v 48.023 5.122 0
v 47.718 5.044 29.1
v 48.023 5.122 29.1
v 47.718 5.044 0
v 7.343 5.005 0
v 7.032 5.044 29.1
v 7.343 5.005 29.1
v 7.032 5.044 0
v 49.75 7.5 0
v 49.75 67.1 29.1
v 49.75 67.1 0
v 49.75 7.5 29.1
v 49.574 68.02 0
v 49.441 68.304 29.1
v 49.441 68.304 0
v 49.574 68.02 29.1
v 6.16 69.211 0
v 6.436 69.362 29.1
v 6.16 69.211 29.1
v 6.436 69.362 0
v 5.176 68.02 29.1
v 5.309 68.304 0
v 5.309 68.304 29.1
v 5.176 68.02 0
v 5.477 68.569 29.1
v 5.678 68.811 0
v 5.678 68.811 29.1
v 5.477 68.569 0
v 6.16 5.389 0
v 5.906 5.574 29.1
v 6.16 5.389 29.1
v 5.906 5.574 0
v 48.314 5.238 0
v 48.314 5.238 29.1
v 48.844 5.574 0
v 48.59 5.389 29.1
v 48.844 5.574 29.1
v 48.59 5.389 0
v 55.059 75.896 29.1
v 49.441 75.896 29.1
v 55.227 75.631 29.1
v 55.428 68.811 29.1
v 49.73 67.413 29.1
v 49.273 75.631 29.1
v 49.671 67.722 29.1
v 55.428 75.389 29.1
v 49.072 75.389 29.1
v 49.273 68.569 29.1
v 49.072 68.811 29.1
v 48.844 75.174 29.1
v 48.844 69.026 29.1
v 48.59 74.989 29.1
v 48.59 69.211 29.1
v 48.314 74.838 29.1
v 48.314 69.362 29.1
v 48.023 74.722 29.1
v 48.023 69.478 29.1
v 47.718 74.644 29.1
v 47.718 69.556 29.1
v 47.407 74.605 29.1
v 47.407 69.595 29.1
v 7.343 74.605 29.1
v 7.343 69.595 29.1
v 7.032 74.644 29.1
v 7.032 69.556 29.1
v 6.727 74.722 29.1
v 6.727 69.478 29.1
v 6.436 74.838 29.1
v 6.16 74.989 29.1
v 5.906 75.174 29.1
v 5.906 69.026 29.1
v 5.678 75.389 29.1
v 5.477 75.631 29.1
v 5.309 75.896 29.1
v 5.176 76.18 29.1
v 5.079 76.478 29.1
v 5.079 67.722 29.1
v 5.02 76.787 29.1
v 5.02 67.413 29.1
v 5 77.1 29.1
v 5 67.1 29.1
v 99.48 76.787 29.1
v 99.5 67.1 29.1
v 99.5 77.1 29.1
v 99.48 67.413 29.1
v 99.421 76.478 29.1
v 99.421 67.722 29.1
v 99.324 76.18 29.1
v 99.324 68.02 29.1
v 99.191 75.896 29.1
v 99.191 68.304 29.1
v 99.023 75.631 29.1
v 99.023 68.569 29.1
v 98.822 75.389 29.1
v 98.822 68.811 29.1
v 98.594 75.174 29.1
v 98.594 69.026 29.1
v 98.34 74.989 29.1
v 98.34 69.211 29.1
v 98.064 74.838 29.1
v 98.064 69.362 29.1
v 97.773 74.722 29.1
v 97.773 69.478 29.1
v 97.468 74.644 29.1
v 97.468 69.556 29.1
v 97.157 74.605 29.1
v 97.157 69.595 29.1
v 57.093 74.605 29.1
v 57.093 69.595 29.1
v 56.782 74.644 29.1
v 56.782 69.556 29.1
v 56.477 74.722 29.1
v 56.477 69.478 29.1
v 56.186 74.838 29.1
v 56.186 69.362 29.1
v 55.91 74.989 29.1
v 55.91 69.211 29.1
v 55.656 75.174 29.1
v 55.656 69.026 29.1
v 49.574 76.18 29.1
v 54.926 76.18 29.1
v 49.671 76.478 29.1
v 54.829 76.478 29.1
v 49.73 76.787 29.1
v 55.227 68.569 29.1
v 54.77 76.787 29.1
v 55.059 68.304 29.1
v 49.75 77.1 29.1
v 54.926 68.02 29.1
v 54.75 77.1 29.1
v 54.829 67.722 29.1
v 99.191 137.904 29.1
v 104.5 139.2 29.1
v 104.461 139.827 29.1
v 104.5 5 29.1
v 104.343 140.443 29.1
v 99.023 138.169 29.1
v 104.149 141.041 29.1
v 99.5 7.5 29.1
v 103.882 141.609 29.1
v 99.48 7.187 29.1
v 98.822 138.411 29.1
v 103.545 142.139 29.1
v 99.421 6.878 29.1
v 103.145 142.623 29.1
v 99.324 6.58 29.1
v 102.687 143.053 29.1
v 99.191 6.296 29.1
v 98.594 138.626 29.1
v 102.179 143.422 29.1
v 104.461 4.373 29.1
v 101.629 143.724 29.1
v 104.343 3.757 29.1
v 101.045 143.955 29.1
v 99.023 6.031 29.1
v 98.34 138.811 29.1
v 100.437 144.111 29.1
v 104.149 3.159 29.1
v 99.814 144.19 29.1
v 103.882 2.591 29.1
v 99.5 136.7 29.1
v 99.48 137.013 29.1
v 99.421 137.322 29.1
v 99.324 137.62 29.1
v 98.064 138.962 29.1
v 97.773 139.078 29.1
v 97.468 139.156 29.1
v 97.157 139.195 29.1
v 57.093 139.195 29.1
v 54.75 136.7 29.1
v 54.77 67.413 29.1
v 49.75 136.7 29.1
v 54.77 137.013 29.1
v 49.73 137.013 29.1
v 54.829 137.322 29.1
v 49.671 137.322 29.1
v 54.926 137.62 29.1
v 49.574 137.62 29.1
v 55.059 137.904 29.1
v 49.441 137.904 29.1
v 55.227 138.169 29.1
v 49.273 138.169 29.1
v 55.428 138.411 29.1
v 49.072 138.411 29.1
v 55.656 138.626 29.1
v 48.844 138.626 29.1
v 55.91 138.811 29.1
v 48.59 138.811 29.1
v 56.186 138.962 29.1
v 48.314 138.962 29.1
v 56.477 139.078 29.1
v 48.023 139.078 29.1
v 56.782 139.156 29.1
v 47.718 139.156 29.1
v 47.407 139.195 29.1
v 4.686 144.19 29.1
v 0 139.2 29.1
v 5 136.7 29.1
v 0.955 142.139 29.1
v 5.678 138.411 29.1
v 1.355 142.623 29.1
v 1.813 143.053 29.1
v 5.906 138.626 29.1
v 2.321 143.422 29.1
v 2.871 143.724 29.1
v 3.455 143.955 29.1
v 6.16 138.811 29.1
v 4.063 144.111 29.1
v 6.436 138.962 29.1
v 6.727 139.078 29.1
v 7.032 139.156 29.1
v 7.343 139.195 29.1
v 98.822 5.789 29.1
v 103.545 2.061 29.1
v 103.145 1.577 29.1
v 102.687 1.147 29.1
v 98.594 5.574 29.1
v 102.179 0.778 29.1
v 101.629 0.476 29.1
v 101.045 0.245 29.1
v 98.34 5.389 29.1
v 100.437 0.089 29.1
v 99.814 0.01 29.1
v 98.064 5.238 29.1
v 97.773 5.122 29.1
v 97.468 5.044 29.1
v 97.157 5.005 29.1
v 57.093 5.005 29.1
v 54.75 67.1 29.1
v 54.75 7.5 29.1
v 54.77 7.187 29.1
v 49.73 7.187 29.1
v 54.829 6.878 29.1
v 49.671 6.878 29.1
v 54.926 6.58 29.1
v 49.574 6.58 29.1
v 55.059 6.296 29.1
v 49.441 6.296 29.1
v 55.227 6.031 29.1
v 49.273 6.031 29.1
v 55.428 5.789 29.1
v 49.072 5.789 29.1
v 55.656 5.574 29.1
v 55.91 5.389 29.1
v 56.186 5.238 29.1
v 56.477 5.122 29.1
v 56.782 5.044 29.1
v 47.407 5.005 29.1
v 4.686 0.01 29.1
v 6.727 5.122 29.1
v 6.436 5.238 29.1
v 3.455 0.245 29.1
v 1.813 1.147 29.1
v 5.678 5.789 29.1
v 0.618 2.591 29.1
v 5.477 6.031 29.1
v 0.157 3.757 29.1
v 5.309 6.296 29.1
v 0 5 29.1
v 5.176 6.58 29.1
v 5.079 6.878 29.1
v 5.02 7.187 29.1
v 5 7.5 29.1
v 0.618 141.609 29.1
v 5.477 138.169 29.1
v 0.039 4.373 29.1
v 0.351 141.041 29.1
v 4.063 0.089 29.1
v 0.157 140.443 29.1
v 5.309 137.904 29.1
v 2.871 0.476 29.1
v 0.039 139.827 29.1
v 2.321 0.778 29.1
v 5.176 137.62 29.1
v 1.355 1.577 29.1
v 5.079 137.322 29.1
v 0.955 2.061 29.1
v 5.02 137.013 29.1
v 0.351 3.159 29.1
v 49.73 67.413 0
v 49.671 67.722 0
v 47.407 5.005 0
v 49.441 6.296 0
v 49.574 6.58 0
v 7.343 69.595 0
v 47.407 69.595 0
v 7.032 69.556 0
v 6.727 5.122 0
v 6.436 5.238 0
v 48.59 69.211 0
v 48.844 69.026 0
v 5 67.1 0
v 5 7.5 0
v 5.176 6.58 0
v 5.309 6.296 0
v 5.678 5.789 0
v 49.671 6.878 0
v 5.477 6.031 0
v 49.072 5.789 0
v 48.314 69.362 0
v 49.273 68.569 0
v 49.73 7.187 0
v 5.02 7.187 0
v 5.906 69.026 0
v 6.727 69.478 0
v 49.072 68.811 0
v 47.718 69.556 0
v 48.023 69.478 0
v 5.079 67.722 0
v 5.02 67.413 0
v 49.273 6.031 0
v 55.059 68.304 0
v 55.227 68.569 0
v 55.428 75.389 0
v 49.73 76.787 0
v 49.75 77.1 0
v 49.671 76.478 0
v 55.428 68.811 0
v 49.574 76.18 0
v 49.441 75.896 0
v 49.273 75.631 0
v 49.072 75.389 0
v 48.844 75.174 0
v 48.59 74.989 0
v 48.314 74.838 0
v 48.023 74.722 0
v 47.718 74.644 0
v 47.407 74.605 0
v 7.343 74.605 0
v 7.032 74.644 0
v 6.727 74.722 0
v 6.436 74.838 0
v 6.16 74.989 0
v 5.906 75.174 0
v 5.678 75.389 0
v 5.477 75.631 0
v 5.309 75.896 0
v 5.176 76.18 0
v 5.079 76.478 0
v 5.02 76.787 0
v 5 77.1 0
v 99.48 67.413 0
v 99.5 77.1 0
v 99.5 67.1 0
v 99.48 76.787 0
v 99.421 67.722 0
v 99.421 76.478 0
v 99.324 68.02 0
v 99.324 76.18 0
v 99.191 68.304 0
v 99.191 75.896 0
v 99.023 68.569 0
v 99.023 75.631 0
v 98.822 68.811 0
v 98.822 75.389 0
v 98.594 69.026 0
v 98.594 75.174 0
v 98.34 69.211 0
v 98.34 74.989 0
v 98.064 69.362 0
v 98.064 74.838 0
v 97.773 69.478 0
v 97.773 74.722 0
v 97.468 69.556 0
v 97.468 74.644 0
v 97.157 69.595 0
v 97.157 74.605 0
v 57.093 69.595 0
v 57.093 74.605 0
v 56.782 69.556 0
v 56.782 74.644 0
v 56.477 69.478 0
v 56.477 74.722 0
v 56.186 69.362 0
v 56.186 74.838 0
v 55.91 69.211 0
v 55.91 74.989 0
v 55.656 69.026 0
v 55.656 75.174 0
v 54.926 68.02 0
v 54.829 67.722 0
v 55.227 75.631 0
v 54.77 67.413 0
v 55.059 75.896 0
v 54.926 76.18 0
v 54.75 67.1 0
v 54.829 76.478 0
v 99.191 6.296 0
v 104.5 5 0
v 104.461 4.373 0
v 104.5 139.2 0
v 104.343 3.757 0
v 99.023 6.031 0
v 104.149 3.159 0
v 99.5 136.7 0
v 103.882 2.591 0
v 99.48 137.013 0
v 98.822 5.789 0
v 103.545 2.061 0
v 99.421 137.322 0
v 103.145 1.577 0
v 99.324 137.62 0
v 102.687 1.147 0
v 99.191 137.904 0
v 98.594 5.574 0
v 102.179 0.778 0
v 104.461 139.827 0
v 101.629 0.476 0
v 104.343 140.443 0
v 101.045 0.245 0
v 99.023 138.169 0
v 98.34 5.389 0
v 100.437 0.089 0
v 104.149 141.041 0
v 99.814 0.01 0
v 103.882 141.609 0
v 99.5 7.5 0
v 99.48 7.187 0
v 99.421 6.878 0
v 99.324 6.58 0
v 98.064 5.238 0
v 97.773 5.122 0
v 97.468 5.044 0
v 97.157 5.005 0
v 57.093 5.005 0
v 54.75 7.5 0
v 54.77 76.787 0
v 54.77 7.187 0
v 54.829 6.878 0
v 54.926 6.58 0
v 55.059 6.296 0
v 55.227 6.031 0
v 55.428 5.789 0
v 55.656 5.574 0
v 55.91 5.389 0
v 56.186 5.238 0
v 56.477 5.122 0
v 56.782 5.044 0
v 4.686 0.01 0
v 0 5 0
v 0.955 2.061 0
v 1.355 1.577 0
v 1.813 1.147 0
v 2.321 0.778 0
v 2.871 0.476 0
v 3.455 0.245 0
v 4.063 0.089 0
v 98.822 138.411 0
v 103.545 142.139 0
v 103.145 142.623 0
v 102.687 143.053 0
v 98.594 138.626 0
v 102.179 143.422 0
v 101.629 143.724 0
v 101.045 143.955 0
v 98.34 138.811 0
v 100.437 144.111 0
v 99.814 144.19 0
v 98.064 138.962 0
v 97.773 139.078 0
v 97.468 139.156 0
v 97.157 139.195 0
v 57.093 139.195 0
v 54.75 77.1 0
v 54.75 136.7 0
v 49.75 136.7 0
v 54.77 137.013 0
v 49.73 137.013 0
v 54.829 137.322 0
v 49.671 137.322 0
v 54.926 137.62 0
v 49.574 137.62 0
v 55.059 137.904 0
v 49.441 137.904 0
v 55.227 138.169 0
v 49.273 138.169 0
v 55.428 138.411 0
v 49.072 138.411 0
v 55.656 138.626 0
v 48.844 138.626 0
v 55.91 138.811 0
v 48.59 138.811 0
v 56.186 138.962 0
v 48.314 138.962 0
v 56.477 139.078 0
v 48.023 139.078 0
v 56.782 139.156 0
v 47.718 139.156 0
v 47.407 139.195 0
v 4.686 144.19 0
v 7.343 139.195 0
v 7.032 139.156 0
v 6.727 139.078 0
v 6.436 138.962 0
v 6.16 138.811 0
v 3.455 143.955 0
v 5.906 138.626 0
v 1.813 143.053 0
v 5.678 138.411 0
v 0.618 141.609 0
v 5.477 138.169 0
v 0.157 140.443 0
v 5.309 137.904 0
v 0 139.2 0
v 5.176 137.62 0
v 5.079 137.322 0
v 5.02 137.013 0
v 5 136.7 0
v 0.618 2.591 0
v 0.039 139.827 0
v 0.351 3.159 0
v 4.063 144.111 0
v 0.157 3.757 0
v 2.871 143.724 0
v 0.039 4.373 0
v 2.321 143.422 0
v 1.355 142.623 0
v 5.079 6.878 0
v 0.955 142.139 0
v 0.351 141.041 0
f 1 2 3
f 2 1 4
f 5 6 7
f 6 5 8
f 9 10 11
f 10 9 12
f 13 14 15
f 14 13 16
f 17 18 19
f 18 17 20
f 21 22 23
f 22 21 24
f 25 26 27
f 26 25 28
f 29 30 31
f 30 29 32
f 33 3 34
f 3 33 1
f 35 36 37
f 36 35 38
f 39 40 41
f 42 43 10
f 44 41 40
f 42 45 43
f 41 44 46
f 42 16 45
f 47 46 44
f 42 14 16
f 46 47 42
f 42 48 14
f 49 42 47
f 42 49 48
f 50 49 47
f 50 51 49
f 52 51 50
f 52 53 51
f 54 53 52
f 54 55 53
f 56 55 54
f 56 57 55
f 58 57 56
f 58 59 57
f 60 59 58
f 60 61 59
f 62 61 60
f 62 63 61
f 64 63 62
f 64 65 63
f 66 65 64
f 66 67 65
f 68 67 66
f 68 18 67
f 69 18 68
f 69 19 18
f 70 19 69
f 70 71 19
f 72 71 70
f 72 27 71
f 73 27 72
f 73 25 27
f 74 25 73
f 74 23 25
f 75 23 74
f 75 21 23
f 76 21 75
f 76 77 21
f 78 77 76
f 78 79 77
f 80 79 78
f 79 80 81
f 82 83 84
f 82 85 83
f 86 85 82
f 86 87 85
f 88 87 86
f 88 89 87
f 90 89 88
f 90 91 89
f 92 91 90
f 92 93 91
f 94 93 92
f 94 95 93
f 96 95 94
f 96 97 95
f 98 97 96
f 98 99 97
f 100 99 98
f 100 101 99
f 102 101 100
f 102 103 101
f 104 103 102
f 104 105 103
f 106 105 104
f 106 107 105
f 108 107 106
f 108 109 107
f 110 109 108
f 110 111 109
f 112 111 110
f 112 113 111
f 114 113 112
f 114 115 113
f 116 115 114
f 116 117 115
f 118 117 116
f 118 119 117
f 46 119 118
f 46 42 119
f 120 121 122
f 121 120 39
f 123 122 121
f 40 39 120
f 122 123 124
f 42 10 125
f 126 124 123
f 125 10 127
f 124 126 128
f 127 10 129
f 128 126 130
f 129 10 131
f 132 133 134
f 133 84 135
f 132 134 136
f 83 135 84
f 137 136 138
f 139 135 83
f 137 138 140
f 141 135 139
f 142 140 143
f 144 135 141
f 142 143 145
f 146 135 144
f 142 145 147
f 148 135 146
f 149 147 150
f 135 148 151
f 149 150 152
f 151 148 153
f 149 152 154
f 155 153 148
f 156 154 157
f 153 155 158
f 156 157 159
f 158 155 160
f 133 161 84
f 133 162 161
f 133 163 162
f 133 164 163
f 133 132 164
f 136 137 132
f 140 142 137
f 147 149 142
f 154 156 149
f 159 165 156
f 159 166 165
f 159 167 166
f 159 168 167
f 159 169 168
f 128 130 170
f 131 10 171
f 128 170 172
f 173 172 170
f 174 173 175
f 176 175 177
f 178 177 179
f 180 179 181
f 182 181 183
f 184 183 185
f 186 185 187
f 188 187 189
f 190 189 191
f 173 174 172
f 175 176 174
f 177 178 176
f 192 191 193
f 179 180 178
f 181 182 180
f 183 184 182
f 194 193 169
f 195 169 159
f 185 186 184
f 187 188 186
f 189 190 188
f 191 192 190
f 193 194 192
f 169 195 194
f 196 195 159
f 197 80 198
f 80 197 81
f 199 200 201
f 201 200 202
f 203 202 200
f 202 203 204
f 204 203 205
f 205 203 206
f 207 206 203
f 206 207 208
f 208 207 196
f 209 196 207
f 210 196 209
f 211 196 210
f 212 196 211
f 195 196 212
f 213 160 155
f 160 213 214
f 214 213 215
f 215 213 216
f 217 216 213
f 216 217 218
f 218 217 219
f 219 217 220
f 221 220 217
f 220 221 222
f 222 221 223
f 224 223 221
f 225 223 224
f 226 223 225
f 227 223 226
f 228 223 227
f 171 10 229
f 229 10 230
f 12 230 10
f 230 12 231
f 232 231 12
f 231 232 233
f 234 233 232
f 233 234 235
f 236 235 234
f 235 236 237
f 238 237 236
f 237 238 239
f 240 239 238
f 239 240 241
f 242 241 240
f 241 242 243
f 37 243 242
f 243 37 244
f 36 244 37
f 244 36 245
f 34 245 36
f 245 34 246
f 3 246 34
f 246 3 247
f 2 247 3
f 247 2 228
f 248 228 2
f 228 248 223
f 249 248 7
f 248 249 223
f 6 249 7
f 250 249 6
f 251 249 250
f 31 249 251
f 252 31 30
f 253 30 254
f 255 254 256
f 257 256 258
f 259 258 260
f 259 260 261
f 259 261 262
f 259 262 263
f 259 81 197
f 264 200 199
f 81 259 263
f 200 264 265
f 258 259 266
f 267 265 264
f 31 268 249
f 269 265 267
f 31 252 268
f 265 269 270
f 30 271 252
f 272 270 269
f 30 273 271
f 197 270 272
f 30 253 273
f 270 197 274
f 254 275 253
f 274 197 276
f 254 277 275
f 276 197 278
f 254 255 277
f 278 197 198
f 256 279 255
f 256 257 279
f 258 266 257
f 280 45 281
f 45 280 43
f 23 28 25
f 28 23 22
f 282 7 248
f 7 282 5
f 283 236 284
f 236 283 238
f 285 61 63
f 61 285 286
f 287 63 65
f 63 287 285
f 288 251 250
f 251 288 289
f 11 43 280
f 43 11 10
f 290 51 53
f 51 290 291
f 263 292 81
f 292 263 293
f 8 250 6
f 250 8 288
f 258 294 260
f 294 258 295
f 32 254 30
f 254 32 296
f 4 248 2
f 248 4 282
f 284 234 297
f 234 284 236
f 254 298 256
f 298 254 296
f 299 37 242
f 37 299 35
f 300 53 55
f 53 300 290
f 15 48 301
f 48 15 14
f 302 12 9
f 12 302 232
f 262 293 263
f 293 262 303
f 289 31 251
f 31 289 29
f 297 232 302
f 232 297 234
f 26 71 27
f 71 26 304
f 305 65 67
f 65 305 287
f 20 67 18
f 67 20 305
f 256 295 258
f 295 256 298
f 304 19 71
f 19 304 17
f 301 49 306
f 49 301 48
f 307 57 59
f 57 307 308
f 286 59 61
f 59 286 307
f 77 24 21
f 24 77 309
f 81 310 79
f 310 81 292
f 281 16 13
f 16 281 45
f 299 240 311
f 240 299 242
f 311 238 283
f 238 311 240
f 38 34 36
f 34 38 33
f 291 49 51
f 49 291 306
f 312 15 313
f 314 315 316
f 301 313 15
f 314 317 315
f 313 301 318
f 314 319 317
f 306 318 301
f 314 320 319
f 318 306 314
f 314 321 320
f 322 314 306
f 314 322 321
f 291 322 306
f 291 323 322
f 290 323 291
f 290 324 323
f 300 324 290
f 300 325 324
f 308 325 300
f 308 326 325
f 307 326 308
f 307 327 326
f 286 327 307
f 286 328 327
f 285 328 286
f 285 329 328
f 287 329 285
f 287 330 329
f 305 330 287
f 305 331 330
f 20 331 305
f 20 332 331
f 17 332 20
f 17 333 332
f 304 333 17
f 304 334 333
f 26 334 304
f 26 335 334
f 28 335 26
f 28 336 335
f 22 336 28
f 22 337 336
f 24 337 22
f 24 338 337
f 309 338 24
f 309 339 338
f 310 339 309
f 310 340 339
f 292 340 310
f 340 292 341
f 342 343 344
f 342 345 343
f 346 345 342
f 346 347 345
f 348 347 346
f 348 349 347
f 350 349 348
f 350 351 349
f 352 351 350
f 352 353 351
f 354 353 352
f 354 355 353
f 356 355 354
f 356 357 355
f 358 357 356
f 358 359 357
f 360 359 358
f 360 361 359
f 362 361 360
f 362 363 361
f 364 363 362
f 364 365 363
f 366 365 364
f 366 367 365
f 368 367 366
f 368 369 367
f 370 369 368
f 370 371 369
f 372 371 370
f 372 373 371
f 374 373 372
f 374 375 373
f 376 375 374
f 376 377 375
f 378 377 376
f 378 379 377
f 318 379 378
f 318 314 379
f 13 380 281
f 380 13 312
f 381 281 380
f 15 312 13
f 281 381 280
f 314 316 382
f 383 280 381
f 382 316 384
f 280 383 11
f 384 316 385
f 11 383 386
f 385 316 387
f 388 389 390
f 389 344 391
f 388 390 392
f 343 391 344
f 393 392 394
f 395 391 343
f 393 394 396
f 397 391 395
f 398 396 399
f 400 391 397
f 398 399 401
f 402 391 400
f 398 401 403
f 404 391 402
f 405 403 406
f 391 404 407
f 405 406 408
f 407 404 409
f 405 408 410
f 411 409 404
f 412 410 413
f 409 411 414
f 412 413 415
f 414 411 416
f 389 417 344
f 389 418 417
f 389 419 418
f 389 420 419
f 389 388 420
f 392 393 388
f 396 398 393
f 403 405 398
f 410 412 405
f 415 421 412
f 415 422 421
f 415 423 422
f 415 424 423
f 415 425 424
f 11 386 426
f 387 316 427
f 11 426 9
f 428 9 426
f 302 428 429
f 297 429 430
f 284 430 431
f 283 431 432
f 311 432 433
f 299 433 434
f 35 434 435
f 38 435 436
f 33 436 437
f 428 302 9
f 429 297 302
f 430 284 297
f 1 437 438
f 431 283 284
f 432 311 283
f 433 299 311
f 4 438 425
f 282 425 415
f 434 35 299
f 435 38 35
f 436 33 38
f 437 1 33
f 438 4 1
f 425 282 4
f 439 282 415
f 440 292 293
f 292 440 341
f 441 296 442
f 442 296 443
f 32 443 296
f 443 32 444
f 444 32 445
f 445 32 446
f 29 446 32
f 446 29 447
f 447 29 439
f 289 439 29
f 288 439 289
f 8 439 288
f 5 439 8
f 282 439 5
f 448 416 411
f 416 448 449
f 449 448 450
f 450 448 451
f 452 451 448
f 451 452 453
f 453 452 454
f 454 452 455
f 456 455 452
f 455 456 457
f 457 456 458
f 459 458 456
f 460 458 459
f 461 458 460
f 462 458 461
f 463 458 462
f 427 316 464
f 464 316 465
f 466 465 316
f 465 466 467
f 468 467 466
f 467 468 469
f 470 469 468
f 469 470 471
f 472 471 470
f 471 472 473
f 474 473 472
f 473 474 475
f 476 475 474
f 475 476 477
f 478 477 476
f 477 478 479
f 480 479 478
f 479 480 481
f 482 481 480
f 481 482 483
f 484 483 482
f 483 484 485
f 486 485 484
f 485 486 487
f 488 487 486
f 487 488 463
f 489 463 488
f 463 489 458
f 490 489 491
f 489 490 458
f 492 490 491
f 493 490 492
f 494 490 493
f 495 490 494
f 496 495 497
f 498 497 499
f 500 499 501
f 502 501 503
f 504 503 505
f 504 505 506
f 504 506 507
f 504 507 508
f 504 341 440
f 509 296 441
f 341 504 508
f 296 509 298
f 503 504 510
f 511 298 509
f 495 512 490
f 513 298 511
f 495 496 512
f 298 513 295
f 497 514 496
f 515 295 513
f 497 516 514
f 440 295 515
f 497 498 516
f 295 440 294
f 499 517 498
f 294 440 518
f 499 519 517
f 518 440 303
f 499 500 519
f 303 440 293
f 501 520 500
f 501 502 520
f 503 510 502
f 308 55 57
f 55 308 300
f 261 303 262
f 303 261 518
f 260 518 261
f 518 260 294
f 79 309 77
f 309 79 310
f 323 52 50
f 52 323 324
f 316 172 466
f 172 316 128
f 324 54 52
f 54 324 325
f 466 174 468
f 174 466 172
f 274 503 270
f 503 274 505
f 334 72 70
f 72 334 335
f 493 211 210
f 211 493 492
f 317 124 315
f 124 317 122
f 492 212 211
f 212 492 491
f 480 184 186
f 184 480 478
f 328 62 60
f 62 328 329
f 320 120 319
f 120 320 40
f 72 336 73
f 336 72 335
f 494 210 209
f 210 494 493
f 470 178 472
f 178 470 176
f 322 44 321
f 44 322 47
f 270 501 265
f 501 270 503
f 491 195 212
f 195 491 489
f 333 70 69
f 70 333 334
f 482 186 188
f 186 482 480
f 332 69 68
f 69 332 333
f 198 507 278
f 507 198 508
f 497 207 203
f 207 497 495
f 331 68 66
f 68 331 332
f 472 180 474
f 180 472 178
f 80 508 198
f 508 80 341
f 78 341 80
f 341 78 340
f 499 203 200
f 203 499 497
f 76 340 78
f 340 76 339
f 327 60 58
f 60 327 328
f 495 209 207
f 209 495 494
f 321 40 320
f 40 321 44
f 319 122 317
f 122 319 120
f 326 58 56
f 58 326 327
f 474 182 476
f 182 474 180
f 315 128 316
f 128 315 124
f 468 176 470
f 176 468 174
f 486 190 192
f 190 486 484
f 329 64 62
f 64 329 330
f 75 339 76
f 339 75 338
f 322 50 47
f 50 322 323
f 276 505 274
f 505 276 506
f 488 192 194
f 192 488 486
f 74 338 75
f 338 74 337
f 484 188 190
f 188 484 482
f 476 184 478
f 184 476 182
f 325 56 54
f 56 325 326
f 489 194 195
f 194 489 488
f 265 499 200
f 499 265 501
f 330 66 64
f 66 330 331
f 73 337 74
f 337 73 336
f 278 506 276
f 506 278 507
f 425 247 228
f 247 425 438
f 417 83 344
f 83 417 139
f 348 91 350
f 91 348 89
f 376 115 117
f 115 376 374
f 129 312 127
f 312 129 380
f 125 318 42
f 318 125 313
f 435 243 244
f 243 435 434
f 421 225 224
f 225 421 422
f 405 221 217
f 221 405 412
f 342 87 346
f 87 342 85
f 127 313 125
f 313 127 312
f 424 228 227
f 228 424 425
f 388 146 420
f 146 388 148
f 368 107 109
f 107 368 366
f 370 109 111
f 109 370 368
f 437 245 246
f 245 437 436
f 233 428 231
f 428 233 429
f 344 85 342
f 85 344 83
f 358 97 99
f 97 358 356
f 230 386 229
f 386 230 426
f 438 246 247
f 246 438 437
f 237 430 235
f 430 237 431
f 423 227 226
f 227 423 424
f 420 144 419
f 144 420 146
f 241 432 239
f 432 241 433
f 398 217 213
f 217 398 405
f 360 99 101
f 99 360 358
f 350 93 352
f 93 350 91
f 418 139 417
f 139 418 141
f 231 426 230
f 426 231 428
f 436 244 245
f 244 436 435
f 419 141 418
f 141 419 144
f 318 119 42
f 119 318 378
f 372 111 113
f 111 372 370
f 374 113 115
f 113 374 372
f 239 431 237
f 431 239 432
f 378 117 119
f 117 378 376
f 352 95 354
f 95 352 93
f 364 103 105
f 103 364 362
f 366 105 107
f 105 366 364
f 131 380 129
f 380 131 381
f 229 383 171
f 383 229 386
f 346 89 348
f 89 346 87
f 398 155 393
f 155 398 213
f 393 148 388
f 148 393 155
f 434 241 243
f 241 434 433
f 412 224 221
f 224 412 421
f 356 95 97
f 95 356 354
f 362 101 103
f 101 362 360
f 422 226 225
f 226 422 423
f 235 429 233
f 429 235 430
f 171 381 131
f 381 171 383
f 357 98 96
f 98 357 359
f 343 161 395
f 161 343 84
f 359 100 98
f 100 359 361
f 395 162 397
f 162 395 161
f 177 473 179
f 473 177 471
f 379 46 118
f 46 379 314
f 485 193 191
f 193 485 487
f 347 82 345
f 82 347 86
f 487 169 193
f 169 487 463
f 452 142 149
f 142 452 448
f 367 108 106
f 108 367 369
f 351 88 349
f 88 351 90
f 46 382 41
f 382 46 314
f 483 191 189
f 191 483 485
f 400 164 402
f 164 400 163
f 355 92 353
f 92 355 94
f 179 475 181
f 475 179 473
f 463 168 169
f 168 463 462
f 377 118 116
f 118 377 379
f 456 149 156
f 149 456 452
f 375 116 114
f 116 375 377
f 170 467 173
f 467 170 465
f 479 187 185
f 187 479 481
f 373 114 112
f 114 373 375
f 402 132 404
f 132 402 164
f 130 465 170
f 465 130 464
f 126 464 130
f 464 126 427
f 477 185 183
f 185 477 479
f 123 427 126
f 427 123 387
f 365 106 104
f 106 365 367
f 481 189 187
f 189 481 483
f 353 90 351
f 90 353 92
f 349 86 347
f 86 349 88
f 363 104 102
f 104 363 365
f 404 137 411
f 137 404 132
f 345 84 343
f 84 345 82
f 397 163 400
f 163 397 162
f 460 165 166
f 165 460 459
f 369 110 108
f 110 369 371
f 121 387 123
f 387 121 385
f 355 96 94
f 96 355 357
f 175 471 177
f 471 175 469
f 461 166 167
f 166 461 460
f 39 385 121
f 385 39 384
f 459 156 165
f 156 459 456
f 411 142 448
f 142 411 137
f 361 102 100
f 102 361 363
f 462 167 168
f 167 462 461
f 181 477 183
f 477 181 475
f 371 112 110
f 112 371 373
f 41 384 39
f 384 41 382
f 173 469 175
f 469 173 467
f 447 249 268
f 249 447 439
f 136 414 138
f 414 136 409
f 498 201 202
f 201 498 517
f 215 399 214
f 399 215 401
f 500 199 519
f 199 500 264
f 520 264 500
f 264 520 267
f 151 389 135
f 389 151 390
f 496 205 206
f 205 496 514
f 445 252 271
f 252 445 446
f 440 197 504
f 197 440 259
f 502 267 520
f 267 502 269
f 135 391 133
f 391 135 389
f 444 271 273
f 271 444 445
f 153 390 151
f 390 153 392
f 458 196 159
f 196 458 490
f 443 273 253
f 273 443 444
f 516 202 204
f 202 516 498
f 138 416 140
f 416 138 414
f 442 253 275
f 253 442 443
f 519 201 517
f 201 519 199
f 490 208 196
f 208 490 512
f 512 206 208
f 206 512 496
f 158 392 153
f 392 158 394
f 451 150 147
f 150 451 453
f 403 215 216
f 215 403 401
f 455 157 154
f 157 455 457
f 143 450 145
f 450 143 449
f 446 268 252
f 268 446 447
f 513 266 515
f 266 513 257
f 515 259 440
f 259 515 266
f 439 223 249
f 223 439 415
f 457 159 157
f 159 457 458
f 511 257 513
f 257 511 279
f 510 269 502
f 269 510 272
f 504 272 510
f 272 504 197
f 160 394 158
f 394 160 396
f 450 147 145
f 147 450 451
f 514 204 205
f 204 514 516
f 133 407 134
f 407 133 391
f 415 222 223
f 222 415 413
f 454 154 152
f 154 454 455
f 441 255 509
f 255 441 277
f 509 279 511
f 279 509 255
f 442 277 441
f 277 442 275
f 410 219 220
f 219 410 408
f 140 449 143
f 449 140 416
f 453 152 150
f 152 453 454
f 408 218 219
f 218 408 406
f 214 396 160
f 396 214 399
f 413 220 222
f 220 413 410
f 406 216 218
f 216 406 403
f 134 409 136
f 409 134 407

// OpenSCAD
// file: ../../shared/chit_storage.scad
module chit_storage(
  width = 100,
  height = 25,
  depth = 22,
  wall_thickness = 2,
  front_wall_thickness = 1,
  columns = 5,
  single_column = true,
  chit_size = 16,
  diameter,
  rounded_ness = 100,
  chit_tolerance = 1,
  chit_thickness = 2,
  chit_count_per_slot = 10,
  finger_spaces = false,
  finger_space_width = 10,
  cover = false,
  cover_thickness = 1,
  cover_wall_thickness = 1,
  cover_text,
  cover_text_size = 5,
  render_cover_separate = false,
) {
  // actual_width = height > width ? height : width;
  // actual_height = height > width ? width : height;

  // vertical = height > width;

  actual_width = width;
  actual_height = height;

  vertical = false;

  chit_x_size = !is_undef(chit_size) ? is_list(chit_size) ? chit_size[0] : chit_size : 0;
  chit_y_size = !is_undef(chit_size) ? is_list(chit_size) ? chit_size[1] : chit_size : 0;
  chit_total_x_size = chit_x_size + chit_tolerance;
  chit_total_y_size = chit_y_size + chit_tolerance;

  chit_total_diameter = is_undef(diameter) ? 0 : diameter + chit_tolerance;

  row_width =
    is_undef(diameter) ?
      chit_total_x_size * columns + wall_thickness * (columns - 1)
    : chit_total_diameter * columns + wall_thickness * (columns - 1);
  row_offset = (actual_width - row_width) / 2;

  module chit_row() {
    for (i = [0:1:(columns - 1)]) {
      translate(
        [
          is_undef(diameter) ?
            (chit_total_x_size + wall_thickness) * i
          : (chit_total_diameter + wall_thickness) * i,
          0,
          0,
        ]
      ) {
        if (is_undef(diameter)) {
          cube([chit_total_x_size, chit_total_y_size, chit_thickness * chit_count_per_slot + chit_tolerance / 2]);

          radius = (chit_total_x_size - 4) / 2;

          translate([chit_total_x_size / 2, -1, -depth])
            scale([1, 1.25, 1])
              cylinder(r=radius, h=2 * depth, $fn=100);
        } else {
          translate([chit_total_diameter / 2, chit_total_diameter / 2, 0])
            cylinder(r=chit_total_diameter / 2, h=chit_thickness * chit_count_per_slot + chit_tolerance / 2, $fn=rounded_ness);

          radius = (chit_total_diameter - 4) / 2;

          translate([chit_total_diameter / 2, -1, -depth])
            scale([1, 1.25, 1])
              cylinder(r=radius, h=2 * depth, $fn=100);
        }
      }
    }
  }

  module finger_cylinder() {
    finger_space_height = (actual_height - 8) / 2;

    scale([1, finger_space_height / finger_space_width, 1])
      cylinder(r=finger_space_width, h=depth, $fn=100);
  }

  module cover() {
    render()
      difference() {
        union() {
          translate([0, 0, depth - cover_thickness])
            cube([actual_width, actual_height, cover_thickness]);

          translate([0, 0, depth / 2])
            difference() {

              cube([actual_width, actual_height, depth / 2]);

              translate([cover_wall_thickness, cover_wall_thickness, 0])
                cube(
                  [
                    actual_width - 2 * cover_wall_thickness,
                    actual_height - 2 * cover_wall_thickness,
                    depth / 2,
                  ]
                );
            }
        }

        if (is_string(cover_text)) {
          metrics = textmetrics(cover_text, cover_text_size);
          text_width = metrics.size.x;
          text_height = metrics.ascent;

          text_inset = min(0.5, cover_thickness / 2);

          translate([actual_width / 2 - text_width / 2, actual_height / 2 - text_height / 2, depth - text_inset])
            linear_extrude(text_inset)
              text(cover_text, cover_text_size);
        }
      }
  }

  translate([0, vertical ? actual_width : 0, 0])
    rotate(vertical ? 270 : 0, [0, 0, 1]) {
      render() difference() {
          cube([actual_width, actual_height, depth - (cover ? cover_thickness : 0)]);

          translate([row_offset, front_wall_thickness, depth - (chit_thickness * chit_count_per_slot) - chit_tolerance / 2 - (cover ? cover_thickness : 0)]) chit_row();

          if (!single_column) {
            translate([row_width + row_offset, actual_height - front_wall_thickness, depth - (chit_thickness * chit_count_per_slot) - chit_tolerance / 2 - (cover ? cover_thickness : 0)])
              rotate(180, [0, 0, 1])
                chit_row();

            if (finger_spaces) {
              single_chit_cube_height =
                is_undef(diameter) ? front_wall_thickness + chit_total_x_size + wall_thickness
                : front_wall_thickness + chit_total_diameter + wall_thickness;
              remaining_space = actual_height - 2 * single_chit_cube_height;

              translate([0, single_chit_cube_height + remaining_space / 2, 0])
                finger_cylinder();

              translate([actual_width, single_chit_cube_height + remaining_space / 2, 0])
                finger_cylinder();
            }
          }

          if (cover) {
            translate([0, 0, depth / 3])
              difference() {
                cube([actual_width, actual_height, depth * 2 / 3]);

                cover_tolerance = 0.3;

                translate([cover_wall_thickness + cover_tolerance, cover_wall_thickness + cover_tolerance, 0])
                  cube(
                    [
                      actual_width - 2 * (cover_wall_thickness + cover_tolerance),
                      actual_height - 2 * (cover_wall_thickness + cover_tolerance),
                      depth * 2 / 3,
                    ]
                  );
              }
          }
        }

      if (cover) {
        if (render_cover_separate) {
          translate([0, 2 * actual_height + 10, depth / 4])
            rotate(180, [1, 0, 0])
              translate([0, 0, -depth * 3 / 4])
                cover();
        } else {
          cover();
        }
      }
    }
}

module chit_storage_filler(
  text,
  text_size = 5,
  text_inset = 1,
  chit_size = 16,
  chit_tolerance = 1,
  chit_thickness = 2,
  chit_count = 10,
) {
  filler_fit_tolerance = 0.3;

  chit_x_size = is_list(chit_size) ? chit_size[0] : chit_size;
  chit_y_size = is_list(chit_size) ? chit_size[1] : chit_size;
  chit_total_x_size = chit_x_size + chit_tolerance - filler_fit_tolerance;
  chit_total_y_size = chit_y_size + chit_tolerance - filler_fit_tolerance;

  render() difference() {
      cube([chit_total_x_size, chit_total_y_size, chit_thickness * chit_count]);

      radius = (chit_total_x_size - 4) / 2;

      translate([chit_total_x_size / 2, -1, 0])
        scale([1, 1.25, 1])
          cylinder(r=radius, h=chit_thickness * chit_count, $fn=100);

      if (!is_undef(text)) {
        name = is_string(text) ? text : str(text);

        metrics = textmetrics(text=name, size=text_size);
        text_width = metrics.advance.x;
        text_height = metrics.ascent;

        translate([chit_total_x_size / 2 - text_width / 2, chit_total_y_size / 2, chit_thickness * chit_count - text_inset])
          linear_extrude(text_inset)
            text(name, text_size);
      }
    }
}

chit_storage(
  height=41,
  columns=4,
  front_wall_thickness=2,
  single_column=false,
  finger_spaces=true,
  cover=true,
  render_cover_separate=true,
  cover_text="Test",
);
// file: ../../shared/spacer.scad
use <rounded_cube.scad>

module generate_spacer(
  wall_thickness = 5,
  area_split = [2, 2],
  fill_parameter = [[220, 2], [290, 2], [35, 1]],
  single_for_rendering = false,
) {
  spacer_width = fill_parameter[0][0] / fill_parameter[0][1];
  spacer_height = fill_parameter[1][0] / fill_parameter[1][1];
  spacer_thickness = fill_parameter[2][0] / fill_parameter[2][1];

  for (x = [0:fill_parameter[0][1] - 1]) {
    for (y = [0:fill_parameter[1][1] - 1]) {
      for (z = [0:fill_parameter[2][1] - 1]) {
        if (single_for_rendering && x == 0 && y == 0 && z == 0 || !single_for_rendering) {
          translate([x * spacer_width, y * spacer_height, z * spacer_thickness])
            render()
              difference() {
                rounded_cube([spacer_width, spacer_height, spacer_thickness], corner_radius=wall_thickness);

                hole_width = (spacer_width - (area_split[0] + 1) * wall_thickness) / area_split[0];
                hole_height = (spacer_height - (area_split[1] + 1) * wall_thickness) / area_split[1];

                for (hx = [0:area_split[0] - 1]) {
                  for (hy = [0:area_split[1] - 1]) {

                    translate(
                      [
                        wall_thickness + hx * (hole_width + wall_thickness),
                        wall_thickness + hy * (hole_height + wall_thickness),
                        0,
                      ]
                    )
                      rounded_cube([hole_width, hole_height, spacer_thickness], corner_radius=wall_thickness / 2);
                  }
                }
              }
        }
      }
    }
  }
}
// file: ../../shared/rounded_cube.scad
module rounded_cube(
  extents,
  corner_radius = 3,
) {
  $fn = 50;

  hull() {
    translate([corner_radius, corner_radius, 0])
      cylinder(h=extents[2], r=corner_radius);

    translate([extents[0] - corner_radius, corner_radius, 0])
      cylinder(h=extents[2], r=corner_radius);

    translate([corner_radius, extents[1] - corner_radius, 0])
      cylinder(h=extents[2], r=corner_radius);

    translate([extents[0] - corner_radius, extents[1] - corner_radius, 0])
      cylinder(h=extents[2], r=corner_radius);
  }
}
// file: ../../shared/general_storage.scad
use <chit_storage.scad>

function calculate_chit_count(chit_thickness, bottom_wall_thickness, depth, cover_thickness) =
  floor((depth - bottom_wall_thickness - cover_thickness) / chit_thickness);

module general_storage(
  chit_size,
  chit_diameter,
  rounded_ness,
  chit_tolerance,
  chit_thickness,
  wall_thickness = 1.2,
  front_wall_thickness = 1,
  bottom_wall_thickness = 1,
  width,
  height,
  depth,
  finger_space_width,
  cover = false,
  cover_thickness = 1,
  cover_wall_thickness = 1,
  cover_text,
  cover_text_size = 5,
  render_cover_separate = false,
) {
  chit_x_size = !is_undef(chit_size) ? is_list(chit_size) ? chit_size[0] : chit_size : 0;
  chit_y_size = !is_undef(chit_size) ? is_list(chit_size) ? chit_size[1] : chit_size : 0;

  column_count =
    is_undef(chit_diameter) ?
      height > width ?
        floor(
          (
            height - (
              !is_undef(finger_space_width) ?
                2 * (finger_space_width + wall_thickness)
              : 0
            ) + wall_thickness
          ) / (chit_x_size + chit_tolerance + wall_thickness)
        )
      : floor(
        (
          width - (
            !is_undef(finger_space_width) ?
              2 * (finger_space_width + wall_thickness)
            : 0
          ) + wall_thickness
        ) / (chit_x_size + chit_tolerance + wall_thickness)
      )
    : floor(
      (
        width - (
          !is_undef(finger_space_width) ?
            2 * (finger_space_width + wall_thickness)
          : 0
        ) + wall_thickness
      ) / (chit_diameter + chit_tolerance + wall_thickness)
    );

  chit_count = calculate_chit_count(chit_thickness, bottom_wall_thickness, depth, cover ? cover_thickness : 0);

  echo(chit_count);

  chit_storage(
    width=width,
    height=height,
    depth=depth,
    wall_thickness=wall_thickness,
    front_wall_thickness=front_wall_thickness,
    chit_size=chit_size,
    diameter=chit_diameter,
    rounded_ness=rounded_ness,
    chit_tolerance=chit_tolerance,
    chit_thickness=chit_thickness,
    columns=column_count,
    chit_count_per_slot=chit_count,
    single_column=false,
    finger_spaces=!is_undef(finger_space_width),
    finger_space_width=!is_undef(finger_space_width) ? finger_space_width : 0,
    cover=cover,
    cover_thickness=cover_thickness,
    cover_wall_thickness=cover_wall_thickness,
    cover_text=cover_text,
    cover_text_size=cover_text_size,
    render_cover_separate=render_cover_separate,
  );
}

module storage_spacer(
  chit_size,
  chit_tolerance,
  chit_thickness,
  bottom_wall_thickness,
  width,
  height,
  depth,
) {
  chit_x_size = is_list(chit_size) ? chit_size[0] : chit_size;
  chit_count = calculate_chit_count(chit_thickness, bottom_wall_thickness, depth);

  for (i = [0:chit_count - 2]) {
    translate([(chit_x_size + chit_tolerance + chit_x_size / 2) * i, 0, 0])
      chit_storage_filler(
        text=chit_count - (i + 1),
        text_size=6,
        chit_size=chit_size,
        chit_tolerance=chit_tolerance,
        chit_thickness=chit_thickness,
        chit_count=i + 1
      );
  }
}

module fill_storage_space(
  chit_size,
  chit_diameter,
  rounded_ness,
  chit_tolerance,
  chit_thickness,
  wall_thickness = 1.2,
  front_wall_thickness = 1.2,
  bottom_wall_thickness = 1,
  fill_parameter = [[220, 2], [290, 7], [35, 3]],
  finger_space_width,
  cover = false,
  cover_thickness = 1,
  cover_wall_thickness = 1,
  single_for_printing = false,
) {
  box_width = fill_parameter[0][0];
  box_height = fill_parameter[1][0];
  box_thickness = fill_parameter[2][0];

  echo(box_width);
  echo(box_height);
  echo(box_thickness);

  storage_x_side_count = fill_parameter[0][1];
  storage_y_side_count = fill_parameter[1][1];
  storage_staple_count = fill_parameter[2][1];

  echo(storage_x_side_count);
  echo(storage_y_side_count);
  echo(storage_staple_count);

  storage_width = box_width / storage_x_side_count;
  storage_height = box_height / storage_y_side_count;
  storage_depth = box_thickness / storage_staple_count;

  if (single_for_printing) {
    general_storage(
      chit_size=chit_size,
      chit_diameter=chit_diameter,
      rounded_ness=rounded_ness,
      chit_thickness=chit_thickness,
      chit_tolerance=chit_tolerance,
      wall_thickness=wall_thickness,
      front_wall_thickness=front_wall_thickness,
      bottom_wall_thickness=bottom_wall_thickness,
      width=storage_width,
      height=storage_height,
      depth=storage_depth,
      finger_space_width=finger_space_width,
      cover=cover,
      cover_thickness=cover_thickness,
      cover_wall_thickness=cover_wall_thickness,
    );
  } else {
    for (x = [0:storage_x_side_count - 1]) {
      for (y = [0:storage_y_side_count - 1]) {
        for (z = [0:storage_staple_count - 1]) {
          translate([x * storage_width, y * storage_height, z * storage_depth])
            general_storage(
              chit_size=chit_size,
              chit_diameter=chit_diameter,
              rounded_ness=rounded_ness,
              chit_thickness=chit_thickness,
              chit_tolerance=chit_tolerance,
              wall_thickness=wall_thickness,
              front_wall_thickness=front_wall_thickness,
              bottom_wall_thickness=bottom_wall_thickness,
              width=storage_width,
              height=storage_height,
              depth=storage_depth,
              finger_space_width=finger_space_width,
              cover=cover,
              cover_thickness=cover_thickness,
              cover_wall_thickness=cover_wall_thickness,
            );
        }
      }
    }
  }
}

fill_storage_space(
  chit_size=15,
  chit_tolerance=1,
  chit_thickness=1.5,
  front_wall_thickness=1.5,
  wall_thickness=0.7,
  fill_parameter=[[213, 2], [295, 8], [8, 1]],
  cover=true,
);
// main file
use <../../shared/general_storage.scad>
use <../../shared/rounded_cube.scad>
use <../../shared/spacer.scad>

// objects

// storage
// card_box
// filler
// spacer

object = "spacer";

box_outer_width = 294;
box_outer_height = 294;
box_outer_depth = 100;

box_wall_thickness = 2.3;

box_inner_width = box_outer_width - 2 * box_wall_thickness;
box_inner_height = box_outer_height - 2 * box_wall_thickness;
box_inner_depth = 101;

storage_tolerance = 1;

sleeve_width = 66.5;
sleeve_height = 92.5;
sleeve_tolerance = 2;
sleeve_thickness = 0.72;
sleeve_count = 54;

paper_width = 210;
paper_height = 280;
paper_thickness = 12;

map_thickness = 15.4;

wall_thickness = 2;

inner_width = sleeve_width + sleeve_tolerance;
inner_height = sleeve_height + sleeve_tolerance;
outer_width = box_inner_width - paper_width;
outer_height = 4 * wall_thickness + inner_height;

area_thickness = box_inner_depth - 2 * map_thickness - paper_thickness;

module card_box() {
  total_depth = box_inner_depth - 2 * map_thickness;
  thickness = sleeve_thickness * sleeve_count;

  render() difference() {
      rounded_cube(
        [
          outer_width,
          outer_height,
          total_depth,
        ],
        corner_radius=10
      );

      translate([(outer_width - thickness) / 2, 2 * wall_thickness, total_depth - inner_width])
        cube([thickness, inner_height, inner_width]);

      translate([0, (2 * wall_thickness + inner_height) / 2, total_depth])
        rotate(90, [0, 1, 0])
          cylinder(h=outer_height, r=inner_height / 4, $fn=100);
    }
}

module filler() {
  wall_thickness = 5;
  corner_radius = 10;

  w = box_inner_width - paper_width;
  h = box_inner_height - outer_height - storage_tolerance;
  d = box_inner_depth - 2 * map_thickness;

  render() difference() {
      rounded_cube(
        [
          w,
          h,
          d,
        ],
        corner_radius=corner_radius
      );

      translate([wall_thickness, wall_thickness, 0])
        rounded_cube(
          [
            w - 2 * wall_thickness,
            h / 2 - 1.5 * wall_thickness,
            d,
          ], corner_radius=corner_radius / 2
        );

      translate([wall_thickness, (wall_thickness + h) / 2, 0])
        rounded_cube(
          [
            w - 2 * wall_thickness,
            h / 2 - 1.5 * wall_thickness,
            d,
          ], corner_radius=corner_radius / 2
        );
    }
}

// color("white") translate([0, 0, box_inner_depth - 2 * map_thickness - paper_thickness]) cube([paper_width, paper_height, paper_thickness]);
// color("green") translate([0, 0, box_inner_depth - map_thickness]) cube([box_inner_width, box_inner_height, map_thickness]);
// color("brown") translate([0, 0, box_inner_depth - 2 * map_thickness]) cube([box_inner_width, box_inner_height, map_thickness]);
// color("lightblue", 0.5) cube([box_inner_width, box_inner_height, box_inner_depth]);

if (is_undef(object) || object == "card_box") {
  translate([paper_width, 0, 0])
    card_box();
}

if (is_undef(object) || object == "filler") {
  translate([paper_width, outer_height, 0])
    filler();
}

if (is_undef(object) || object == "spacer") {
  generate_spacer(
    wall_thickness=5,
    area_split=[2, 2],
    fill_parameter=[
      [paper_width - storage_tolerance, 2],
      [box_inner_height - storage_tolerance, 2],
      [area_thickness / 2, 1],
    ],
    single_for_rendering=is_undef(object) || object != "spacer" ? false : true
  );
}

inch = 25.4;

chit_size = inch * 9 / 16;
chit_tolerance = 1;
chit_thickness = 2.1;

if (is_undef(object) || object == "storage") {
  translate([0, 0, area_thickness / 2])
    fill_storage_space(
      chit_size=chit_size,
      chit_tolerance=chit_tolerance,
      chit_thickness=chit_thickness,
      wall_thickness=1.2,
      front_wall_thickness=1.2,
      bottom_wall_thickness=1,
      fill_parameter=[
        [paper_width - storage_tolerance, 2],
        [box_inner_height - storage_tolerance, 8],
        [area_thickness / 2, 2],
      ],
      finger_space_width=10,
      cover=false,
      cover_thickness=1,
      cover_wall_thickness=1,
      single_for_printing=is_undef(object) || object != "storage" ? false : true
    );
}
